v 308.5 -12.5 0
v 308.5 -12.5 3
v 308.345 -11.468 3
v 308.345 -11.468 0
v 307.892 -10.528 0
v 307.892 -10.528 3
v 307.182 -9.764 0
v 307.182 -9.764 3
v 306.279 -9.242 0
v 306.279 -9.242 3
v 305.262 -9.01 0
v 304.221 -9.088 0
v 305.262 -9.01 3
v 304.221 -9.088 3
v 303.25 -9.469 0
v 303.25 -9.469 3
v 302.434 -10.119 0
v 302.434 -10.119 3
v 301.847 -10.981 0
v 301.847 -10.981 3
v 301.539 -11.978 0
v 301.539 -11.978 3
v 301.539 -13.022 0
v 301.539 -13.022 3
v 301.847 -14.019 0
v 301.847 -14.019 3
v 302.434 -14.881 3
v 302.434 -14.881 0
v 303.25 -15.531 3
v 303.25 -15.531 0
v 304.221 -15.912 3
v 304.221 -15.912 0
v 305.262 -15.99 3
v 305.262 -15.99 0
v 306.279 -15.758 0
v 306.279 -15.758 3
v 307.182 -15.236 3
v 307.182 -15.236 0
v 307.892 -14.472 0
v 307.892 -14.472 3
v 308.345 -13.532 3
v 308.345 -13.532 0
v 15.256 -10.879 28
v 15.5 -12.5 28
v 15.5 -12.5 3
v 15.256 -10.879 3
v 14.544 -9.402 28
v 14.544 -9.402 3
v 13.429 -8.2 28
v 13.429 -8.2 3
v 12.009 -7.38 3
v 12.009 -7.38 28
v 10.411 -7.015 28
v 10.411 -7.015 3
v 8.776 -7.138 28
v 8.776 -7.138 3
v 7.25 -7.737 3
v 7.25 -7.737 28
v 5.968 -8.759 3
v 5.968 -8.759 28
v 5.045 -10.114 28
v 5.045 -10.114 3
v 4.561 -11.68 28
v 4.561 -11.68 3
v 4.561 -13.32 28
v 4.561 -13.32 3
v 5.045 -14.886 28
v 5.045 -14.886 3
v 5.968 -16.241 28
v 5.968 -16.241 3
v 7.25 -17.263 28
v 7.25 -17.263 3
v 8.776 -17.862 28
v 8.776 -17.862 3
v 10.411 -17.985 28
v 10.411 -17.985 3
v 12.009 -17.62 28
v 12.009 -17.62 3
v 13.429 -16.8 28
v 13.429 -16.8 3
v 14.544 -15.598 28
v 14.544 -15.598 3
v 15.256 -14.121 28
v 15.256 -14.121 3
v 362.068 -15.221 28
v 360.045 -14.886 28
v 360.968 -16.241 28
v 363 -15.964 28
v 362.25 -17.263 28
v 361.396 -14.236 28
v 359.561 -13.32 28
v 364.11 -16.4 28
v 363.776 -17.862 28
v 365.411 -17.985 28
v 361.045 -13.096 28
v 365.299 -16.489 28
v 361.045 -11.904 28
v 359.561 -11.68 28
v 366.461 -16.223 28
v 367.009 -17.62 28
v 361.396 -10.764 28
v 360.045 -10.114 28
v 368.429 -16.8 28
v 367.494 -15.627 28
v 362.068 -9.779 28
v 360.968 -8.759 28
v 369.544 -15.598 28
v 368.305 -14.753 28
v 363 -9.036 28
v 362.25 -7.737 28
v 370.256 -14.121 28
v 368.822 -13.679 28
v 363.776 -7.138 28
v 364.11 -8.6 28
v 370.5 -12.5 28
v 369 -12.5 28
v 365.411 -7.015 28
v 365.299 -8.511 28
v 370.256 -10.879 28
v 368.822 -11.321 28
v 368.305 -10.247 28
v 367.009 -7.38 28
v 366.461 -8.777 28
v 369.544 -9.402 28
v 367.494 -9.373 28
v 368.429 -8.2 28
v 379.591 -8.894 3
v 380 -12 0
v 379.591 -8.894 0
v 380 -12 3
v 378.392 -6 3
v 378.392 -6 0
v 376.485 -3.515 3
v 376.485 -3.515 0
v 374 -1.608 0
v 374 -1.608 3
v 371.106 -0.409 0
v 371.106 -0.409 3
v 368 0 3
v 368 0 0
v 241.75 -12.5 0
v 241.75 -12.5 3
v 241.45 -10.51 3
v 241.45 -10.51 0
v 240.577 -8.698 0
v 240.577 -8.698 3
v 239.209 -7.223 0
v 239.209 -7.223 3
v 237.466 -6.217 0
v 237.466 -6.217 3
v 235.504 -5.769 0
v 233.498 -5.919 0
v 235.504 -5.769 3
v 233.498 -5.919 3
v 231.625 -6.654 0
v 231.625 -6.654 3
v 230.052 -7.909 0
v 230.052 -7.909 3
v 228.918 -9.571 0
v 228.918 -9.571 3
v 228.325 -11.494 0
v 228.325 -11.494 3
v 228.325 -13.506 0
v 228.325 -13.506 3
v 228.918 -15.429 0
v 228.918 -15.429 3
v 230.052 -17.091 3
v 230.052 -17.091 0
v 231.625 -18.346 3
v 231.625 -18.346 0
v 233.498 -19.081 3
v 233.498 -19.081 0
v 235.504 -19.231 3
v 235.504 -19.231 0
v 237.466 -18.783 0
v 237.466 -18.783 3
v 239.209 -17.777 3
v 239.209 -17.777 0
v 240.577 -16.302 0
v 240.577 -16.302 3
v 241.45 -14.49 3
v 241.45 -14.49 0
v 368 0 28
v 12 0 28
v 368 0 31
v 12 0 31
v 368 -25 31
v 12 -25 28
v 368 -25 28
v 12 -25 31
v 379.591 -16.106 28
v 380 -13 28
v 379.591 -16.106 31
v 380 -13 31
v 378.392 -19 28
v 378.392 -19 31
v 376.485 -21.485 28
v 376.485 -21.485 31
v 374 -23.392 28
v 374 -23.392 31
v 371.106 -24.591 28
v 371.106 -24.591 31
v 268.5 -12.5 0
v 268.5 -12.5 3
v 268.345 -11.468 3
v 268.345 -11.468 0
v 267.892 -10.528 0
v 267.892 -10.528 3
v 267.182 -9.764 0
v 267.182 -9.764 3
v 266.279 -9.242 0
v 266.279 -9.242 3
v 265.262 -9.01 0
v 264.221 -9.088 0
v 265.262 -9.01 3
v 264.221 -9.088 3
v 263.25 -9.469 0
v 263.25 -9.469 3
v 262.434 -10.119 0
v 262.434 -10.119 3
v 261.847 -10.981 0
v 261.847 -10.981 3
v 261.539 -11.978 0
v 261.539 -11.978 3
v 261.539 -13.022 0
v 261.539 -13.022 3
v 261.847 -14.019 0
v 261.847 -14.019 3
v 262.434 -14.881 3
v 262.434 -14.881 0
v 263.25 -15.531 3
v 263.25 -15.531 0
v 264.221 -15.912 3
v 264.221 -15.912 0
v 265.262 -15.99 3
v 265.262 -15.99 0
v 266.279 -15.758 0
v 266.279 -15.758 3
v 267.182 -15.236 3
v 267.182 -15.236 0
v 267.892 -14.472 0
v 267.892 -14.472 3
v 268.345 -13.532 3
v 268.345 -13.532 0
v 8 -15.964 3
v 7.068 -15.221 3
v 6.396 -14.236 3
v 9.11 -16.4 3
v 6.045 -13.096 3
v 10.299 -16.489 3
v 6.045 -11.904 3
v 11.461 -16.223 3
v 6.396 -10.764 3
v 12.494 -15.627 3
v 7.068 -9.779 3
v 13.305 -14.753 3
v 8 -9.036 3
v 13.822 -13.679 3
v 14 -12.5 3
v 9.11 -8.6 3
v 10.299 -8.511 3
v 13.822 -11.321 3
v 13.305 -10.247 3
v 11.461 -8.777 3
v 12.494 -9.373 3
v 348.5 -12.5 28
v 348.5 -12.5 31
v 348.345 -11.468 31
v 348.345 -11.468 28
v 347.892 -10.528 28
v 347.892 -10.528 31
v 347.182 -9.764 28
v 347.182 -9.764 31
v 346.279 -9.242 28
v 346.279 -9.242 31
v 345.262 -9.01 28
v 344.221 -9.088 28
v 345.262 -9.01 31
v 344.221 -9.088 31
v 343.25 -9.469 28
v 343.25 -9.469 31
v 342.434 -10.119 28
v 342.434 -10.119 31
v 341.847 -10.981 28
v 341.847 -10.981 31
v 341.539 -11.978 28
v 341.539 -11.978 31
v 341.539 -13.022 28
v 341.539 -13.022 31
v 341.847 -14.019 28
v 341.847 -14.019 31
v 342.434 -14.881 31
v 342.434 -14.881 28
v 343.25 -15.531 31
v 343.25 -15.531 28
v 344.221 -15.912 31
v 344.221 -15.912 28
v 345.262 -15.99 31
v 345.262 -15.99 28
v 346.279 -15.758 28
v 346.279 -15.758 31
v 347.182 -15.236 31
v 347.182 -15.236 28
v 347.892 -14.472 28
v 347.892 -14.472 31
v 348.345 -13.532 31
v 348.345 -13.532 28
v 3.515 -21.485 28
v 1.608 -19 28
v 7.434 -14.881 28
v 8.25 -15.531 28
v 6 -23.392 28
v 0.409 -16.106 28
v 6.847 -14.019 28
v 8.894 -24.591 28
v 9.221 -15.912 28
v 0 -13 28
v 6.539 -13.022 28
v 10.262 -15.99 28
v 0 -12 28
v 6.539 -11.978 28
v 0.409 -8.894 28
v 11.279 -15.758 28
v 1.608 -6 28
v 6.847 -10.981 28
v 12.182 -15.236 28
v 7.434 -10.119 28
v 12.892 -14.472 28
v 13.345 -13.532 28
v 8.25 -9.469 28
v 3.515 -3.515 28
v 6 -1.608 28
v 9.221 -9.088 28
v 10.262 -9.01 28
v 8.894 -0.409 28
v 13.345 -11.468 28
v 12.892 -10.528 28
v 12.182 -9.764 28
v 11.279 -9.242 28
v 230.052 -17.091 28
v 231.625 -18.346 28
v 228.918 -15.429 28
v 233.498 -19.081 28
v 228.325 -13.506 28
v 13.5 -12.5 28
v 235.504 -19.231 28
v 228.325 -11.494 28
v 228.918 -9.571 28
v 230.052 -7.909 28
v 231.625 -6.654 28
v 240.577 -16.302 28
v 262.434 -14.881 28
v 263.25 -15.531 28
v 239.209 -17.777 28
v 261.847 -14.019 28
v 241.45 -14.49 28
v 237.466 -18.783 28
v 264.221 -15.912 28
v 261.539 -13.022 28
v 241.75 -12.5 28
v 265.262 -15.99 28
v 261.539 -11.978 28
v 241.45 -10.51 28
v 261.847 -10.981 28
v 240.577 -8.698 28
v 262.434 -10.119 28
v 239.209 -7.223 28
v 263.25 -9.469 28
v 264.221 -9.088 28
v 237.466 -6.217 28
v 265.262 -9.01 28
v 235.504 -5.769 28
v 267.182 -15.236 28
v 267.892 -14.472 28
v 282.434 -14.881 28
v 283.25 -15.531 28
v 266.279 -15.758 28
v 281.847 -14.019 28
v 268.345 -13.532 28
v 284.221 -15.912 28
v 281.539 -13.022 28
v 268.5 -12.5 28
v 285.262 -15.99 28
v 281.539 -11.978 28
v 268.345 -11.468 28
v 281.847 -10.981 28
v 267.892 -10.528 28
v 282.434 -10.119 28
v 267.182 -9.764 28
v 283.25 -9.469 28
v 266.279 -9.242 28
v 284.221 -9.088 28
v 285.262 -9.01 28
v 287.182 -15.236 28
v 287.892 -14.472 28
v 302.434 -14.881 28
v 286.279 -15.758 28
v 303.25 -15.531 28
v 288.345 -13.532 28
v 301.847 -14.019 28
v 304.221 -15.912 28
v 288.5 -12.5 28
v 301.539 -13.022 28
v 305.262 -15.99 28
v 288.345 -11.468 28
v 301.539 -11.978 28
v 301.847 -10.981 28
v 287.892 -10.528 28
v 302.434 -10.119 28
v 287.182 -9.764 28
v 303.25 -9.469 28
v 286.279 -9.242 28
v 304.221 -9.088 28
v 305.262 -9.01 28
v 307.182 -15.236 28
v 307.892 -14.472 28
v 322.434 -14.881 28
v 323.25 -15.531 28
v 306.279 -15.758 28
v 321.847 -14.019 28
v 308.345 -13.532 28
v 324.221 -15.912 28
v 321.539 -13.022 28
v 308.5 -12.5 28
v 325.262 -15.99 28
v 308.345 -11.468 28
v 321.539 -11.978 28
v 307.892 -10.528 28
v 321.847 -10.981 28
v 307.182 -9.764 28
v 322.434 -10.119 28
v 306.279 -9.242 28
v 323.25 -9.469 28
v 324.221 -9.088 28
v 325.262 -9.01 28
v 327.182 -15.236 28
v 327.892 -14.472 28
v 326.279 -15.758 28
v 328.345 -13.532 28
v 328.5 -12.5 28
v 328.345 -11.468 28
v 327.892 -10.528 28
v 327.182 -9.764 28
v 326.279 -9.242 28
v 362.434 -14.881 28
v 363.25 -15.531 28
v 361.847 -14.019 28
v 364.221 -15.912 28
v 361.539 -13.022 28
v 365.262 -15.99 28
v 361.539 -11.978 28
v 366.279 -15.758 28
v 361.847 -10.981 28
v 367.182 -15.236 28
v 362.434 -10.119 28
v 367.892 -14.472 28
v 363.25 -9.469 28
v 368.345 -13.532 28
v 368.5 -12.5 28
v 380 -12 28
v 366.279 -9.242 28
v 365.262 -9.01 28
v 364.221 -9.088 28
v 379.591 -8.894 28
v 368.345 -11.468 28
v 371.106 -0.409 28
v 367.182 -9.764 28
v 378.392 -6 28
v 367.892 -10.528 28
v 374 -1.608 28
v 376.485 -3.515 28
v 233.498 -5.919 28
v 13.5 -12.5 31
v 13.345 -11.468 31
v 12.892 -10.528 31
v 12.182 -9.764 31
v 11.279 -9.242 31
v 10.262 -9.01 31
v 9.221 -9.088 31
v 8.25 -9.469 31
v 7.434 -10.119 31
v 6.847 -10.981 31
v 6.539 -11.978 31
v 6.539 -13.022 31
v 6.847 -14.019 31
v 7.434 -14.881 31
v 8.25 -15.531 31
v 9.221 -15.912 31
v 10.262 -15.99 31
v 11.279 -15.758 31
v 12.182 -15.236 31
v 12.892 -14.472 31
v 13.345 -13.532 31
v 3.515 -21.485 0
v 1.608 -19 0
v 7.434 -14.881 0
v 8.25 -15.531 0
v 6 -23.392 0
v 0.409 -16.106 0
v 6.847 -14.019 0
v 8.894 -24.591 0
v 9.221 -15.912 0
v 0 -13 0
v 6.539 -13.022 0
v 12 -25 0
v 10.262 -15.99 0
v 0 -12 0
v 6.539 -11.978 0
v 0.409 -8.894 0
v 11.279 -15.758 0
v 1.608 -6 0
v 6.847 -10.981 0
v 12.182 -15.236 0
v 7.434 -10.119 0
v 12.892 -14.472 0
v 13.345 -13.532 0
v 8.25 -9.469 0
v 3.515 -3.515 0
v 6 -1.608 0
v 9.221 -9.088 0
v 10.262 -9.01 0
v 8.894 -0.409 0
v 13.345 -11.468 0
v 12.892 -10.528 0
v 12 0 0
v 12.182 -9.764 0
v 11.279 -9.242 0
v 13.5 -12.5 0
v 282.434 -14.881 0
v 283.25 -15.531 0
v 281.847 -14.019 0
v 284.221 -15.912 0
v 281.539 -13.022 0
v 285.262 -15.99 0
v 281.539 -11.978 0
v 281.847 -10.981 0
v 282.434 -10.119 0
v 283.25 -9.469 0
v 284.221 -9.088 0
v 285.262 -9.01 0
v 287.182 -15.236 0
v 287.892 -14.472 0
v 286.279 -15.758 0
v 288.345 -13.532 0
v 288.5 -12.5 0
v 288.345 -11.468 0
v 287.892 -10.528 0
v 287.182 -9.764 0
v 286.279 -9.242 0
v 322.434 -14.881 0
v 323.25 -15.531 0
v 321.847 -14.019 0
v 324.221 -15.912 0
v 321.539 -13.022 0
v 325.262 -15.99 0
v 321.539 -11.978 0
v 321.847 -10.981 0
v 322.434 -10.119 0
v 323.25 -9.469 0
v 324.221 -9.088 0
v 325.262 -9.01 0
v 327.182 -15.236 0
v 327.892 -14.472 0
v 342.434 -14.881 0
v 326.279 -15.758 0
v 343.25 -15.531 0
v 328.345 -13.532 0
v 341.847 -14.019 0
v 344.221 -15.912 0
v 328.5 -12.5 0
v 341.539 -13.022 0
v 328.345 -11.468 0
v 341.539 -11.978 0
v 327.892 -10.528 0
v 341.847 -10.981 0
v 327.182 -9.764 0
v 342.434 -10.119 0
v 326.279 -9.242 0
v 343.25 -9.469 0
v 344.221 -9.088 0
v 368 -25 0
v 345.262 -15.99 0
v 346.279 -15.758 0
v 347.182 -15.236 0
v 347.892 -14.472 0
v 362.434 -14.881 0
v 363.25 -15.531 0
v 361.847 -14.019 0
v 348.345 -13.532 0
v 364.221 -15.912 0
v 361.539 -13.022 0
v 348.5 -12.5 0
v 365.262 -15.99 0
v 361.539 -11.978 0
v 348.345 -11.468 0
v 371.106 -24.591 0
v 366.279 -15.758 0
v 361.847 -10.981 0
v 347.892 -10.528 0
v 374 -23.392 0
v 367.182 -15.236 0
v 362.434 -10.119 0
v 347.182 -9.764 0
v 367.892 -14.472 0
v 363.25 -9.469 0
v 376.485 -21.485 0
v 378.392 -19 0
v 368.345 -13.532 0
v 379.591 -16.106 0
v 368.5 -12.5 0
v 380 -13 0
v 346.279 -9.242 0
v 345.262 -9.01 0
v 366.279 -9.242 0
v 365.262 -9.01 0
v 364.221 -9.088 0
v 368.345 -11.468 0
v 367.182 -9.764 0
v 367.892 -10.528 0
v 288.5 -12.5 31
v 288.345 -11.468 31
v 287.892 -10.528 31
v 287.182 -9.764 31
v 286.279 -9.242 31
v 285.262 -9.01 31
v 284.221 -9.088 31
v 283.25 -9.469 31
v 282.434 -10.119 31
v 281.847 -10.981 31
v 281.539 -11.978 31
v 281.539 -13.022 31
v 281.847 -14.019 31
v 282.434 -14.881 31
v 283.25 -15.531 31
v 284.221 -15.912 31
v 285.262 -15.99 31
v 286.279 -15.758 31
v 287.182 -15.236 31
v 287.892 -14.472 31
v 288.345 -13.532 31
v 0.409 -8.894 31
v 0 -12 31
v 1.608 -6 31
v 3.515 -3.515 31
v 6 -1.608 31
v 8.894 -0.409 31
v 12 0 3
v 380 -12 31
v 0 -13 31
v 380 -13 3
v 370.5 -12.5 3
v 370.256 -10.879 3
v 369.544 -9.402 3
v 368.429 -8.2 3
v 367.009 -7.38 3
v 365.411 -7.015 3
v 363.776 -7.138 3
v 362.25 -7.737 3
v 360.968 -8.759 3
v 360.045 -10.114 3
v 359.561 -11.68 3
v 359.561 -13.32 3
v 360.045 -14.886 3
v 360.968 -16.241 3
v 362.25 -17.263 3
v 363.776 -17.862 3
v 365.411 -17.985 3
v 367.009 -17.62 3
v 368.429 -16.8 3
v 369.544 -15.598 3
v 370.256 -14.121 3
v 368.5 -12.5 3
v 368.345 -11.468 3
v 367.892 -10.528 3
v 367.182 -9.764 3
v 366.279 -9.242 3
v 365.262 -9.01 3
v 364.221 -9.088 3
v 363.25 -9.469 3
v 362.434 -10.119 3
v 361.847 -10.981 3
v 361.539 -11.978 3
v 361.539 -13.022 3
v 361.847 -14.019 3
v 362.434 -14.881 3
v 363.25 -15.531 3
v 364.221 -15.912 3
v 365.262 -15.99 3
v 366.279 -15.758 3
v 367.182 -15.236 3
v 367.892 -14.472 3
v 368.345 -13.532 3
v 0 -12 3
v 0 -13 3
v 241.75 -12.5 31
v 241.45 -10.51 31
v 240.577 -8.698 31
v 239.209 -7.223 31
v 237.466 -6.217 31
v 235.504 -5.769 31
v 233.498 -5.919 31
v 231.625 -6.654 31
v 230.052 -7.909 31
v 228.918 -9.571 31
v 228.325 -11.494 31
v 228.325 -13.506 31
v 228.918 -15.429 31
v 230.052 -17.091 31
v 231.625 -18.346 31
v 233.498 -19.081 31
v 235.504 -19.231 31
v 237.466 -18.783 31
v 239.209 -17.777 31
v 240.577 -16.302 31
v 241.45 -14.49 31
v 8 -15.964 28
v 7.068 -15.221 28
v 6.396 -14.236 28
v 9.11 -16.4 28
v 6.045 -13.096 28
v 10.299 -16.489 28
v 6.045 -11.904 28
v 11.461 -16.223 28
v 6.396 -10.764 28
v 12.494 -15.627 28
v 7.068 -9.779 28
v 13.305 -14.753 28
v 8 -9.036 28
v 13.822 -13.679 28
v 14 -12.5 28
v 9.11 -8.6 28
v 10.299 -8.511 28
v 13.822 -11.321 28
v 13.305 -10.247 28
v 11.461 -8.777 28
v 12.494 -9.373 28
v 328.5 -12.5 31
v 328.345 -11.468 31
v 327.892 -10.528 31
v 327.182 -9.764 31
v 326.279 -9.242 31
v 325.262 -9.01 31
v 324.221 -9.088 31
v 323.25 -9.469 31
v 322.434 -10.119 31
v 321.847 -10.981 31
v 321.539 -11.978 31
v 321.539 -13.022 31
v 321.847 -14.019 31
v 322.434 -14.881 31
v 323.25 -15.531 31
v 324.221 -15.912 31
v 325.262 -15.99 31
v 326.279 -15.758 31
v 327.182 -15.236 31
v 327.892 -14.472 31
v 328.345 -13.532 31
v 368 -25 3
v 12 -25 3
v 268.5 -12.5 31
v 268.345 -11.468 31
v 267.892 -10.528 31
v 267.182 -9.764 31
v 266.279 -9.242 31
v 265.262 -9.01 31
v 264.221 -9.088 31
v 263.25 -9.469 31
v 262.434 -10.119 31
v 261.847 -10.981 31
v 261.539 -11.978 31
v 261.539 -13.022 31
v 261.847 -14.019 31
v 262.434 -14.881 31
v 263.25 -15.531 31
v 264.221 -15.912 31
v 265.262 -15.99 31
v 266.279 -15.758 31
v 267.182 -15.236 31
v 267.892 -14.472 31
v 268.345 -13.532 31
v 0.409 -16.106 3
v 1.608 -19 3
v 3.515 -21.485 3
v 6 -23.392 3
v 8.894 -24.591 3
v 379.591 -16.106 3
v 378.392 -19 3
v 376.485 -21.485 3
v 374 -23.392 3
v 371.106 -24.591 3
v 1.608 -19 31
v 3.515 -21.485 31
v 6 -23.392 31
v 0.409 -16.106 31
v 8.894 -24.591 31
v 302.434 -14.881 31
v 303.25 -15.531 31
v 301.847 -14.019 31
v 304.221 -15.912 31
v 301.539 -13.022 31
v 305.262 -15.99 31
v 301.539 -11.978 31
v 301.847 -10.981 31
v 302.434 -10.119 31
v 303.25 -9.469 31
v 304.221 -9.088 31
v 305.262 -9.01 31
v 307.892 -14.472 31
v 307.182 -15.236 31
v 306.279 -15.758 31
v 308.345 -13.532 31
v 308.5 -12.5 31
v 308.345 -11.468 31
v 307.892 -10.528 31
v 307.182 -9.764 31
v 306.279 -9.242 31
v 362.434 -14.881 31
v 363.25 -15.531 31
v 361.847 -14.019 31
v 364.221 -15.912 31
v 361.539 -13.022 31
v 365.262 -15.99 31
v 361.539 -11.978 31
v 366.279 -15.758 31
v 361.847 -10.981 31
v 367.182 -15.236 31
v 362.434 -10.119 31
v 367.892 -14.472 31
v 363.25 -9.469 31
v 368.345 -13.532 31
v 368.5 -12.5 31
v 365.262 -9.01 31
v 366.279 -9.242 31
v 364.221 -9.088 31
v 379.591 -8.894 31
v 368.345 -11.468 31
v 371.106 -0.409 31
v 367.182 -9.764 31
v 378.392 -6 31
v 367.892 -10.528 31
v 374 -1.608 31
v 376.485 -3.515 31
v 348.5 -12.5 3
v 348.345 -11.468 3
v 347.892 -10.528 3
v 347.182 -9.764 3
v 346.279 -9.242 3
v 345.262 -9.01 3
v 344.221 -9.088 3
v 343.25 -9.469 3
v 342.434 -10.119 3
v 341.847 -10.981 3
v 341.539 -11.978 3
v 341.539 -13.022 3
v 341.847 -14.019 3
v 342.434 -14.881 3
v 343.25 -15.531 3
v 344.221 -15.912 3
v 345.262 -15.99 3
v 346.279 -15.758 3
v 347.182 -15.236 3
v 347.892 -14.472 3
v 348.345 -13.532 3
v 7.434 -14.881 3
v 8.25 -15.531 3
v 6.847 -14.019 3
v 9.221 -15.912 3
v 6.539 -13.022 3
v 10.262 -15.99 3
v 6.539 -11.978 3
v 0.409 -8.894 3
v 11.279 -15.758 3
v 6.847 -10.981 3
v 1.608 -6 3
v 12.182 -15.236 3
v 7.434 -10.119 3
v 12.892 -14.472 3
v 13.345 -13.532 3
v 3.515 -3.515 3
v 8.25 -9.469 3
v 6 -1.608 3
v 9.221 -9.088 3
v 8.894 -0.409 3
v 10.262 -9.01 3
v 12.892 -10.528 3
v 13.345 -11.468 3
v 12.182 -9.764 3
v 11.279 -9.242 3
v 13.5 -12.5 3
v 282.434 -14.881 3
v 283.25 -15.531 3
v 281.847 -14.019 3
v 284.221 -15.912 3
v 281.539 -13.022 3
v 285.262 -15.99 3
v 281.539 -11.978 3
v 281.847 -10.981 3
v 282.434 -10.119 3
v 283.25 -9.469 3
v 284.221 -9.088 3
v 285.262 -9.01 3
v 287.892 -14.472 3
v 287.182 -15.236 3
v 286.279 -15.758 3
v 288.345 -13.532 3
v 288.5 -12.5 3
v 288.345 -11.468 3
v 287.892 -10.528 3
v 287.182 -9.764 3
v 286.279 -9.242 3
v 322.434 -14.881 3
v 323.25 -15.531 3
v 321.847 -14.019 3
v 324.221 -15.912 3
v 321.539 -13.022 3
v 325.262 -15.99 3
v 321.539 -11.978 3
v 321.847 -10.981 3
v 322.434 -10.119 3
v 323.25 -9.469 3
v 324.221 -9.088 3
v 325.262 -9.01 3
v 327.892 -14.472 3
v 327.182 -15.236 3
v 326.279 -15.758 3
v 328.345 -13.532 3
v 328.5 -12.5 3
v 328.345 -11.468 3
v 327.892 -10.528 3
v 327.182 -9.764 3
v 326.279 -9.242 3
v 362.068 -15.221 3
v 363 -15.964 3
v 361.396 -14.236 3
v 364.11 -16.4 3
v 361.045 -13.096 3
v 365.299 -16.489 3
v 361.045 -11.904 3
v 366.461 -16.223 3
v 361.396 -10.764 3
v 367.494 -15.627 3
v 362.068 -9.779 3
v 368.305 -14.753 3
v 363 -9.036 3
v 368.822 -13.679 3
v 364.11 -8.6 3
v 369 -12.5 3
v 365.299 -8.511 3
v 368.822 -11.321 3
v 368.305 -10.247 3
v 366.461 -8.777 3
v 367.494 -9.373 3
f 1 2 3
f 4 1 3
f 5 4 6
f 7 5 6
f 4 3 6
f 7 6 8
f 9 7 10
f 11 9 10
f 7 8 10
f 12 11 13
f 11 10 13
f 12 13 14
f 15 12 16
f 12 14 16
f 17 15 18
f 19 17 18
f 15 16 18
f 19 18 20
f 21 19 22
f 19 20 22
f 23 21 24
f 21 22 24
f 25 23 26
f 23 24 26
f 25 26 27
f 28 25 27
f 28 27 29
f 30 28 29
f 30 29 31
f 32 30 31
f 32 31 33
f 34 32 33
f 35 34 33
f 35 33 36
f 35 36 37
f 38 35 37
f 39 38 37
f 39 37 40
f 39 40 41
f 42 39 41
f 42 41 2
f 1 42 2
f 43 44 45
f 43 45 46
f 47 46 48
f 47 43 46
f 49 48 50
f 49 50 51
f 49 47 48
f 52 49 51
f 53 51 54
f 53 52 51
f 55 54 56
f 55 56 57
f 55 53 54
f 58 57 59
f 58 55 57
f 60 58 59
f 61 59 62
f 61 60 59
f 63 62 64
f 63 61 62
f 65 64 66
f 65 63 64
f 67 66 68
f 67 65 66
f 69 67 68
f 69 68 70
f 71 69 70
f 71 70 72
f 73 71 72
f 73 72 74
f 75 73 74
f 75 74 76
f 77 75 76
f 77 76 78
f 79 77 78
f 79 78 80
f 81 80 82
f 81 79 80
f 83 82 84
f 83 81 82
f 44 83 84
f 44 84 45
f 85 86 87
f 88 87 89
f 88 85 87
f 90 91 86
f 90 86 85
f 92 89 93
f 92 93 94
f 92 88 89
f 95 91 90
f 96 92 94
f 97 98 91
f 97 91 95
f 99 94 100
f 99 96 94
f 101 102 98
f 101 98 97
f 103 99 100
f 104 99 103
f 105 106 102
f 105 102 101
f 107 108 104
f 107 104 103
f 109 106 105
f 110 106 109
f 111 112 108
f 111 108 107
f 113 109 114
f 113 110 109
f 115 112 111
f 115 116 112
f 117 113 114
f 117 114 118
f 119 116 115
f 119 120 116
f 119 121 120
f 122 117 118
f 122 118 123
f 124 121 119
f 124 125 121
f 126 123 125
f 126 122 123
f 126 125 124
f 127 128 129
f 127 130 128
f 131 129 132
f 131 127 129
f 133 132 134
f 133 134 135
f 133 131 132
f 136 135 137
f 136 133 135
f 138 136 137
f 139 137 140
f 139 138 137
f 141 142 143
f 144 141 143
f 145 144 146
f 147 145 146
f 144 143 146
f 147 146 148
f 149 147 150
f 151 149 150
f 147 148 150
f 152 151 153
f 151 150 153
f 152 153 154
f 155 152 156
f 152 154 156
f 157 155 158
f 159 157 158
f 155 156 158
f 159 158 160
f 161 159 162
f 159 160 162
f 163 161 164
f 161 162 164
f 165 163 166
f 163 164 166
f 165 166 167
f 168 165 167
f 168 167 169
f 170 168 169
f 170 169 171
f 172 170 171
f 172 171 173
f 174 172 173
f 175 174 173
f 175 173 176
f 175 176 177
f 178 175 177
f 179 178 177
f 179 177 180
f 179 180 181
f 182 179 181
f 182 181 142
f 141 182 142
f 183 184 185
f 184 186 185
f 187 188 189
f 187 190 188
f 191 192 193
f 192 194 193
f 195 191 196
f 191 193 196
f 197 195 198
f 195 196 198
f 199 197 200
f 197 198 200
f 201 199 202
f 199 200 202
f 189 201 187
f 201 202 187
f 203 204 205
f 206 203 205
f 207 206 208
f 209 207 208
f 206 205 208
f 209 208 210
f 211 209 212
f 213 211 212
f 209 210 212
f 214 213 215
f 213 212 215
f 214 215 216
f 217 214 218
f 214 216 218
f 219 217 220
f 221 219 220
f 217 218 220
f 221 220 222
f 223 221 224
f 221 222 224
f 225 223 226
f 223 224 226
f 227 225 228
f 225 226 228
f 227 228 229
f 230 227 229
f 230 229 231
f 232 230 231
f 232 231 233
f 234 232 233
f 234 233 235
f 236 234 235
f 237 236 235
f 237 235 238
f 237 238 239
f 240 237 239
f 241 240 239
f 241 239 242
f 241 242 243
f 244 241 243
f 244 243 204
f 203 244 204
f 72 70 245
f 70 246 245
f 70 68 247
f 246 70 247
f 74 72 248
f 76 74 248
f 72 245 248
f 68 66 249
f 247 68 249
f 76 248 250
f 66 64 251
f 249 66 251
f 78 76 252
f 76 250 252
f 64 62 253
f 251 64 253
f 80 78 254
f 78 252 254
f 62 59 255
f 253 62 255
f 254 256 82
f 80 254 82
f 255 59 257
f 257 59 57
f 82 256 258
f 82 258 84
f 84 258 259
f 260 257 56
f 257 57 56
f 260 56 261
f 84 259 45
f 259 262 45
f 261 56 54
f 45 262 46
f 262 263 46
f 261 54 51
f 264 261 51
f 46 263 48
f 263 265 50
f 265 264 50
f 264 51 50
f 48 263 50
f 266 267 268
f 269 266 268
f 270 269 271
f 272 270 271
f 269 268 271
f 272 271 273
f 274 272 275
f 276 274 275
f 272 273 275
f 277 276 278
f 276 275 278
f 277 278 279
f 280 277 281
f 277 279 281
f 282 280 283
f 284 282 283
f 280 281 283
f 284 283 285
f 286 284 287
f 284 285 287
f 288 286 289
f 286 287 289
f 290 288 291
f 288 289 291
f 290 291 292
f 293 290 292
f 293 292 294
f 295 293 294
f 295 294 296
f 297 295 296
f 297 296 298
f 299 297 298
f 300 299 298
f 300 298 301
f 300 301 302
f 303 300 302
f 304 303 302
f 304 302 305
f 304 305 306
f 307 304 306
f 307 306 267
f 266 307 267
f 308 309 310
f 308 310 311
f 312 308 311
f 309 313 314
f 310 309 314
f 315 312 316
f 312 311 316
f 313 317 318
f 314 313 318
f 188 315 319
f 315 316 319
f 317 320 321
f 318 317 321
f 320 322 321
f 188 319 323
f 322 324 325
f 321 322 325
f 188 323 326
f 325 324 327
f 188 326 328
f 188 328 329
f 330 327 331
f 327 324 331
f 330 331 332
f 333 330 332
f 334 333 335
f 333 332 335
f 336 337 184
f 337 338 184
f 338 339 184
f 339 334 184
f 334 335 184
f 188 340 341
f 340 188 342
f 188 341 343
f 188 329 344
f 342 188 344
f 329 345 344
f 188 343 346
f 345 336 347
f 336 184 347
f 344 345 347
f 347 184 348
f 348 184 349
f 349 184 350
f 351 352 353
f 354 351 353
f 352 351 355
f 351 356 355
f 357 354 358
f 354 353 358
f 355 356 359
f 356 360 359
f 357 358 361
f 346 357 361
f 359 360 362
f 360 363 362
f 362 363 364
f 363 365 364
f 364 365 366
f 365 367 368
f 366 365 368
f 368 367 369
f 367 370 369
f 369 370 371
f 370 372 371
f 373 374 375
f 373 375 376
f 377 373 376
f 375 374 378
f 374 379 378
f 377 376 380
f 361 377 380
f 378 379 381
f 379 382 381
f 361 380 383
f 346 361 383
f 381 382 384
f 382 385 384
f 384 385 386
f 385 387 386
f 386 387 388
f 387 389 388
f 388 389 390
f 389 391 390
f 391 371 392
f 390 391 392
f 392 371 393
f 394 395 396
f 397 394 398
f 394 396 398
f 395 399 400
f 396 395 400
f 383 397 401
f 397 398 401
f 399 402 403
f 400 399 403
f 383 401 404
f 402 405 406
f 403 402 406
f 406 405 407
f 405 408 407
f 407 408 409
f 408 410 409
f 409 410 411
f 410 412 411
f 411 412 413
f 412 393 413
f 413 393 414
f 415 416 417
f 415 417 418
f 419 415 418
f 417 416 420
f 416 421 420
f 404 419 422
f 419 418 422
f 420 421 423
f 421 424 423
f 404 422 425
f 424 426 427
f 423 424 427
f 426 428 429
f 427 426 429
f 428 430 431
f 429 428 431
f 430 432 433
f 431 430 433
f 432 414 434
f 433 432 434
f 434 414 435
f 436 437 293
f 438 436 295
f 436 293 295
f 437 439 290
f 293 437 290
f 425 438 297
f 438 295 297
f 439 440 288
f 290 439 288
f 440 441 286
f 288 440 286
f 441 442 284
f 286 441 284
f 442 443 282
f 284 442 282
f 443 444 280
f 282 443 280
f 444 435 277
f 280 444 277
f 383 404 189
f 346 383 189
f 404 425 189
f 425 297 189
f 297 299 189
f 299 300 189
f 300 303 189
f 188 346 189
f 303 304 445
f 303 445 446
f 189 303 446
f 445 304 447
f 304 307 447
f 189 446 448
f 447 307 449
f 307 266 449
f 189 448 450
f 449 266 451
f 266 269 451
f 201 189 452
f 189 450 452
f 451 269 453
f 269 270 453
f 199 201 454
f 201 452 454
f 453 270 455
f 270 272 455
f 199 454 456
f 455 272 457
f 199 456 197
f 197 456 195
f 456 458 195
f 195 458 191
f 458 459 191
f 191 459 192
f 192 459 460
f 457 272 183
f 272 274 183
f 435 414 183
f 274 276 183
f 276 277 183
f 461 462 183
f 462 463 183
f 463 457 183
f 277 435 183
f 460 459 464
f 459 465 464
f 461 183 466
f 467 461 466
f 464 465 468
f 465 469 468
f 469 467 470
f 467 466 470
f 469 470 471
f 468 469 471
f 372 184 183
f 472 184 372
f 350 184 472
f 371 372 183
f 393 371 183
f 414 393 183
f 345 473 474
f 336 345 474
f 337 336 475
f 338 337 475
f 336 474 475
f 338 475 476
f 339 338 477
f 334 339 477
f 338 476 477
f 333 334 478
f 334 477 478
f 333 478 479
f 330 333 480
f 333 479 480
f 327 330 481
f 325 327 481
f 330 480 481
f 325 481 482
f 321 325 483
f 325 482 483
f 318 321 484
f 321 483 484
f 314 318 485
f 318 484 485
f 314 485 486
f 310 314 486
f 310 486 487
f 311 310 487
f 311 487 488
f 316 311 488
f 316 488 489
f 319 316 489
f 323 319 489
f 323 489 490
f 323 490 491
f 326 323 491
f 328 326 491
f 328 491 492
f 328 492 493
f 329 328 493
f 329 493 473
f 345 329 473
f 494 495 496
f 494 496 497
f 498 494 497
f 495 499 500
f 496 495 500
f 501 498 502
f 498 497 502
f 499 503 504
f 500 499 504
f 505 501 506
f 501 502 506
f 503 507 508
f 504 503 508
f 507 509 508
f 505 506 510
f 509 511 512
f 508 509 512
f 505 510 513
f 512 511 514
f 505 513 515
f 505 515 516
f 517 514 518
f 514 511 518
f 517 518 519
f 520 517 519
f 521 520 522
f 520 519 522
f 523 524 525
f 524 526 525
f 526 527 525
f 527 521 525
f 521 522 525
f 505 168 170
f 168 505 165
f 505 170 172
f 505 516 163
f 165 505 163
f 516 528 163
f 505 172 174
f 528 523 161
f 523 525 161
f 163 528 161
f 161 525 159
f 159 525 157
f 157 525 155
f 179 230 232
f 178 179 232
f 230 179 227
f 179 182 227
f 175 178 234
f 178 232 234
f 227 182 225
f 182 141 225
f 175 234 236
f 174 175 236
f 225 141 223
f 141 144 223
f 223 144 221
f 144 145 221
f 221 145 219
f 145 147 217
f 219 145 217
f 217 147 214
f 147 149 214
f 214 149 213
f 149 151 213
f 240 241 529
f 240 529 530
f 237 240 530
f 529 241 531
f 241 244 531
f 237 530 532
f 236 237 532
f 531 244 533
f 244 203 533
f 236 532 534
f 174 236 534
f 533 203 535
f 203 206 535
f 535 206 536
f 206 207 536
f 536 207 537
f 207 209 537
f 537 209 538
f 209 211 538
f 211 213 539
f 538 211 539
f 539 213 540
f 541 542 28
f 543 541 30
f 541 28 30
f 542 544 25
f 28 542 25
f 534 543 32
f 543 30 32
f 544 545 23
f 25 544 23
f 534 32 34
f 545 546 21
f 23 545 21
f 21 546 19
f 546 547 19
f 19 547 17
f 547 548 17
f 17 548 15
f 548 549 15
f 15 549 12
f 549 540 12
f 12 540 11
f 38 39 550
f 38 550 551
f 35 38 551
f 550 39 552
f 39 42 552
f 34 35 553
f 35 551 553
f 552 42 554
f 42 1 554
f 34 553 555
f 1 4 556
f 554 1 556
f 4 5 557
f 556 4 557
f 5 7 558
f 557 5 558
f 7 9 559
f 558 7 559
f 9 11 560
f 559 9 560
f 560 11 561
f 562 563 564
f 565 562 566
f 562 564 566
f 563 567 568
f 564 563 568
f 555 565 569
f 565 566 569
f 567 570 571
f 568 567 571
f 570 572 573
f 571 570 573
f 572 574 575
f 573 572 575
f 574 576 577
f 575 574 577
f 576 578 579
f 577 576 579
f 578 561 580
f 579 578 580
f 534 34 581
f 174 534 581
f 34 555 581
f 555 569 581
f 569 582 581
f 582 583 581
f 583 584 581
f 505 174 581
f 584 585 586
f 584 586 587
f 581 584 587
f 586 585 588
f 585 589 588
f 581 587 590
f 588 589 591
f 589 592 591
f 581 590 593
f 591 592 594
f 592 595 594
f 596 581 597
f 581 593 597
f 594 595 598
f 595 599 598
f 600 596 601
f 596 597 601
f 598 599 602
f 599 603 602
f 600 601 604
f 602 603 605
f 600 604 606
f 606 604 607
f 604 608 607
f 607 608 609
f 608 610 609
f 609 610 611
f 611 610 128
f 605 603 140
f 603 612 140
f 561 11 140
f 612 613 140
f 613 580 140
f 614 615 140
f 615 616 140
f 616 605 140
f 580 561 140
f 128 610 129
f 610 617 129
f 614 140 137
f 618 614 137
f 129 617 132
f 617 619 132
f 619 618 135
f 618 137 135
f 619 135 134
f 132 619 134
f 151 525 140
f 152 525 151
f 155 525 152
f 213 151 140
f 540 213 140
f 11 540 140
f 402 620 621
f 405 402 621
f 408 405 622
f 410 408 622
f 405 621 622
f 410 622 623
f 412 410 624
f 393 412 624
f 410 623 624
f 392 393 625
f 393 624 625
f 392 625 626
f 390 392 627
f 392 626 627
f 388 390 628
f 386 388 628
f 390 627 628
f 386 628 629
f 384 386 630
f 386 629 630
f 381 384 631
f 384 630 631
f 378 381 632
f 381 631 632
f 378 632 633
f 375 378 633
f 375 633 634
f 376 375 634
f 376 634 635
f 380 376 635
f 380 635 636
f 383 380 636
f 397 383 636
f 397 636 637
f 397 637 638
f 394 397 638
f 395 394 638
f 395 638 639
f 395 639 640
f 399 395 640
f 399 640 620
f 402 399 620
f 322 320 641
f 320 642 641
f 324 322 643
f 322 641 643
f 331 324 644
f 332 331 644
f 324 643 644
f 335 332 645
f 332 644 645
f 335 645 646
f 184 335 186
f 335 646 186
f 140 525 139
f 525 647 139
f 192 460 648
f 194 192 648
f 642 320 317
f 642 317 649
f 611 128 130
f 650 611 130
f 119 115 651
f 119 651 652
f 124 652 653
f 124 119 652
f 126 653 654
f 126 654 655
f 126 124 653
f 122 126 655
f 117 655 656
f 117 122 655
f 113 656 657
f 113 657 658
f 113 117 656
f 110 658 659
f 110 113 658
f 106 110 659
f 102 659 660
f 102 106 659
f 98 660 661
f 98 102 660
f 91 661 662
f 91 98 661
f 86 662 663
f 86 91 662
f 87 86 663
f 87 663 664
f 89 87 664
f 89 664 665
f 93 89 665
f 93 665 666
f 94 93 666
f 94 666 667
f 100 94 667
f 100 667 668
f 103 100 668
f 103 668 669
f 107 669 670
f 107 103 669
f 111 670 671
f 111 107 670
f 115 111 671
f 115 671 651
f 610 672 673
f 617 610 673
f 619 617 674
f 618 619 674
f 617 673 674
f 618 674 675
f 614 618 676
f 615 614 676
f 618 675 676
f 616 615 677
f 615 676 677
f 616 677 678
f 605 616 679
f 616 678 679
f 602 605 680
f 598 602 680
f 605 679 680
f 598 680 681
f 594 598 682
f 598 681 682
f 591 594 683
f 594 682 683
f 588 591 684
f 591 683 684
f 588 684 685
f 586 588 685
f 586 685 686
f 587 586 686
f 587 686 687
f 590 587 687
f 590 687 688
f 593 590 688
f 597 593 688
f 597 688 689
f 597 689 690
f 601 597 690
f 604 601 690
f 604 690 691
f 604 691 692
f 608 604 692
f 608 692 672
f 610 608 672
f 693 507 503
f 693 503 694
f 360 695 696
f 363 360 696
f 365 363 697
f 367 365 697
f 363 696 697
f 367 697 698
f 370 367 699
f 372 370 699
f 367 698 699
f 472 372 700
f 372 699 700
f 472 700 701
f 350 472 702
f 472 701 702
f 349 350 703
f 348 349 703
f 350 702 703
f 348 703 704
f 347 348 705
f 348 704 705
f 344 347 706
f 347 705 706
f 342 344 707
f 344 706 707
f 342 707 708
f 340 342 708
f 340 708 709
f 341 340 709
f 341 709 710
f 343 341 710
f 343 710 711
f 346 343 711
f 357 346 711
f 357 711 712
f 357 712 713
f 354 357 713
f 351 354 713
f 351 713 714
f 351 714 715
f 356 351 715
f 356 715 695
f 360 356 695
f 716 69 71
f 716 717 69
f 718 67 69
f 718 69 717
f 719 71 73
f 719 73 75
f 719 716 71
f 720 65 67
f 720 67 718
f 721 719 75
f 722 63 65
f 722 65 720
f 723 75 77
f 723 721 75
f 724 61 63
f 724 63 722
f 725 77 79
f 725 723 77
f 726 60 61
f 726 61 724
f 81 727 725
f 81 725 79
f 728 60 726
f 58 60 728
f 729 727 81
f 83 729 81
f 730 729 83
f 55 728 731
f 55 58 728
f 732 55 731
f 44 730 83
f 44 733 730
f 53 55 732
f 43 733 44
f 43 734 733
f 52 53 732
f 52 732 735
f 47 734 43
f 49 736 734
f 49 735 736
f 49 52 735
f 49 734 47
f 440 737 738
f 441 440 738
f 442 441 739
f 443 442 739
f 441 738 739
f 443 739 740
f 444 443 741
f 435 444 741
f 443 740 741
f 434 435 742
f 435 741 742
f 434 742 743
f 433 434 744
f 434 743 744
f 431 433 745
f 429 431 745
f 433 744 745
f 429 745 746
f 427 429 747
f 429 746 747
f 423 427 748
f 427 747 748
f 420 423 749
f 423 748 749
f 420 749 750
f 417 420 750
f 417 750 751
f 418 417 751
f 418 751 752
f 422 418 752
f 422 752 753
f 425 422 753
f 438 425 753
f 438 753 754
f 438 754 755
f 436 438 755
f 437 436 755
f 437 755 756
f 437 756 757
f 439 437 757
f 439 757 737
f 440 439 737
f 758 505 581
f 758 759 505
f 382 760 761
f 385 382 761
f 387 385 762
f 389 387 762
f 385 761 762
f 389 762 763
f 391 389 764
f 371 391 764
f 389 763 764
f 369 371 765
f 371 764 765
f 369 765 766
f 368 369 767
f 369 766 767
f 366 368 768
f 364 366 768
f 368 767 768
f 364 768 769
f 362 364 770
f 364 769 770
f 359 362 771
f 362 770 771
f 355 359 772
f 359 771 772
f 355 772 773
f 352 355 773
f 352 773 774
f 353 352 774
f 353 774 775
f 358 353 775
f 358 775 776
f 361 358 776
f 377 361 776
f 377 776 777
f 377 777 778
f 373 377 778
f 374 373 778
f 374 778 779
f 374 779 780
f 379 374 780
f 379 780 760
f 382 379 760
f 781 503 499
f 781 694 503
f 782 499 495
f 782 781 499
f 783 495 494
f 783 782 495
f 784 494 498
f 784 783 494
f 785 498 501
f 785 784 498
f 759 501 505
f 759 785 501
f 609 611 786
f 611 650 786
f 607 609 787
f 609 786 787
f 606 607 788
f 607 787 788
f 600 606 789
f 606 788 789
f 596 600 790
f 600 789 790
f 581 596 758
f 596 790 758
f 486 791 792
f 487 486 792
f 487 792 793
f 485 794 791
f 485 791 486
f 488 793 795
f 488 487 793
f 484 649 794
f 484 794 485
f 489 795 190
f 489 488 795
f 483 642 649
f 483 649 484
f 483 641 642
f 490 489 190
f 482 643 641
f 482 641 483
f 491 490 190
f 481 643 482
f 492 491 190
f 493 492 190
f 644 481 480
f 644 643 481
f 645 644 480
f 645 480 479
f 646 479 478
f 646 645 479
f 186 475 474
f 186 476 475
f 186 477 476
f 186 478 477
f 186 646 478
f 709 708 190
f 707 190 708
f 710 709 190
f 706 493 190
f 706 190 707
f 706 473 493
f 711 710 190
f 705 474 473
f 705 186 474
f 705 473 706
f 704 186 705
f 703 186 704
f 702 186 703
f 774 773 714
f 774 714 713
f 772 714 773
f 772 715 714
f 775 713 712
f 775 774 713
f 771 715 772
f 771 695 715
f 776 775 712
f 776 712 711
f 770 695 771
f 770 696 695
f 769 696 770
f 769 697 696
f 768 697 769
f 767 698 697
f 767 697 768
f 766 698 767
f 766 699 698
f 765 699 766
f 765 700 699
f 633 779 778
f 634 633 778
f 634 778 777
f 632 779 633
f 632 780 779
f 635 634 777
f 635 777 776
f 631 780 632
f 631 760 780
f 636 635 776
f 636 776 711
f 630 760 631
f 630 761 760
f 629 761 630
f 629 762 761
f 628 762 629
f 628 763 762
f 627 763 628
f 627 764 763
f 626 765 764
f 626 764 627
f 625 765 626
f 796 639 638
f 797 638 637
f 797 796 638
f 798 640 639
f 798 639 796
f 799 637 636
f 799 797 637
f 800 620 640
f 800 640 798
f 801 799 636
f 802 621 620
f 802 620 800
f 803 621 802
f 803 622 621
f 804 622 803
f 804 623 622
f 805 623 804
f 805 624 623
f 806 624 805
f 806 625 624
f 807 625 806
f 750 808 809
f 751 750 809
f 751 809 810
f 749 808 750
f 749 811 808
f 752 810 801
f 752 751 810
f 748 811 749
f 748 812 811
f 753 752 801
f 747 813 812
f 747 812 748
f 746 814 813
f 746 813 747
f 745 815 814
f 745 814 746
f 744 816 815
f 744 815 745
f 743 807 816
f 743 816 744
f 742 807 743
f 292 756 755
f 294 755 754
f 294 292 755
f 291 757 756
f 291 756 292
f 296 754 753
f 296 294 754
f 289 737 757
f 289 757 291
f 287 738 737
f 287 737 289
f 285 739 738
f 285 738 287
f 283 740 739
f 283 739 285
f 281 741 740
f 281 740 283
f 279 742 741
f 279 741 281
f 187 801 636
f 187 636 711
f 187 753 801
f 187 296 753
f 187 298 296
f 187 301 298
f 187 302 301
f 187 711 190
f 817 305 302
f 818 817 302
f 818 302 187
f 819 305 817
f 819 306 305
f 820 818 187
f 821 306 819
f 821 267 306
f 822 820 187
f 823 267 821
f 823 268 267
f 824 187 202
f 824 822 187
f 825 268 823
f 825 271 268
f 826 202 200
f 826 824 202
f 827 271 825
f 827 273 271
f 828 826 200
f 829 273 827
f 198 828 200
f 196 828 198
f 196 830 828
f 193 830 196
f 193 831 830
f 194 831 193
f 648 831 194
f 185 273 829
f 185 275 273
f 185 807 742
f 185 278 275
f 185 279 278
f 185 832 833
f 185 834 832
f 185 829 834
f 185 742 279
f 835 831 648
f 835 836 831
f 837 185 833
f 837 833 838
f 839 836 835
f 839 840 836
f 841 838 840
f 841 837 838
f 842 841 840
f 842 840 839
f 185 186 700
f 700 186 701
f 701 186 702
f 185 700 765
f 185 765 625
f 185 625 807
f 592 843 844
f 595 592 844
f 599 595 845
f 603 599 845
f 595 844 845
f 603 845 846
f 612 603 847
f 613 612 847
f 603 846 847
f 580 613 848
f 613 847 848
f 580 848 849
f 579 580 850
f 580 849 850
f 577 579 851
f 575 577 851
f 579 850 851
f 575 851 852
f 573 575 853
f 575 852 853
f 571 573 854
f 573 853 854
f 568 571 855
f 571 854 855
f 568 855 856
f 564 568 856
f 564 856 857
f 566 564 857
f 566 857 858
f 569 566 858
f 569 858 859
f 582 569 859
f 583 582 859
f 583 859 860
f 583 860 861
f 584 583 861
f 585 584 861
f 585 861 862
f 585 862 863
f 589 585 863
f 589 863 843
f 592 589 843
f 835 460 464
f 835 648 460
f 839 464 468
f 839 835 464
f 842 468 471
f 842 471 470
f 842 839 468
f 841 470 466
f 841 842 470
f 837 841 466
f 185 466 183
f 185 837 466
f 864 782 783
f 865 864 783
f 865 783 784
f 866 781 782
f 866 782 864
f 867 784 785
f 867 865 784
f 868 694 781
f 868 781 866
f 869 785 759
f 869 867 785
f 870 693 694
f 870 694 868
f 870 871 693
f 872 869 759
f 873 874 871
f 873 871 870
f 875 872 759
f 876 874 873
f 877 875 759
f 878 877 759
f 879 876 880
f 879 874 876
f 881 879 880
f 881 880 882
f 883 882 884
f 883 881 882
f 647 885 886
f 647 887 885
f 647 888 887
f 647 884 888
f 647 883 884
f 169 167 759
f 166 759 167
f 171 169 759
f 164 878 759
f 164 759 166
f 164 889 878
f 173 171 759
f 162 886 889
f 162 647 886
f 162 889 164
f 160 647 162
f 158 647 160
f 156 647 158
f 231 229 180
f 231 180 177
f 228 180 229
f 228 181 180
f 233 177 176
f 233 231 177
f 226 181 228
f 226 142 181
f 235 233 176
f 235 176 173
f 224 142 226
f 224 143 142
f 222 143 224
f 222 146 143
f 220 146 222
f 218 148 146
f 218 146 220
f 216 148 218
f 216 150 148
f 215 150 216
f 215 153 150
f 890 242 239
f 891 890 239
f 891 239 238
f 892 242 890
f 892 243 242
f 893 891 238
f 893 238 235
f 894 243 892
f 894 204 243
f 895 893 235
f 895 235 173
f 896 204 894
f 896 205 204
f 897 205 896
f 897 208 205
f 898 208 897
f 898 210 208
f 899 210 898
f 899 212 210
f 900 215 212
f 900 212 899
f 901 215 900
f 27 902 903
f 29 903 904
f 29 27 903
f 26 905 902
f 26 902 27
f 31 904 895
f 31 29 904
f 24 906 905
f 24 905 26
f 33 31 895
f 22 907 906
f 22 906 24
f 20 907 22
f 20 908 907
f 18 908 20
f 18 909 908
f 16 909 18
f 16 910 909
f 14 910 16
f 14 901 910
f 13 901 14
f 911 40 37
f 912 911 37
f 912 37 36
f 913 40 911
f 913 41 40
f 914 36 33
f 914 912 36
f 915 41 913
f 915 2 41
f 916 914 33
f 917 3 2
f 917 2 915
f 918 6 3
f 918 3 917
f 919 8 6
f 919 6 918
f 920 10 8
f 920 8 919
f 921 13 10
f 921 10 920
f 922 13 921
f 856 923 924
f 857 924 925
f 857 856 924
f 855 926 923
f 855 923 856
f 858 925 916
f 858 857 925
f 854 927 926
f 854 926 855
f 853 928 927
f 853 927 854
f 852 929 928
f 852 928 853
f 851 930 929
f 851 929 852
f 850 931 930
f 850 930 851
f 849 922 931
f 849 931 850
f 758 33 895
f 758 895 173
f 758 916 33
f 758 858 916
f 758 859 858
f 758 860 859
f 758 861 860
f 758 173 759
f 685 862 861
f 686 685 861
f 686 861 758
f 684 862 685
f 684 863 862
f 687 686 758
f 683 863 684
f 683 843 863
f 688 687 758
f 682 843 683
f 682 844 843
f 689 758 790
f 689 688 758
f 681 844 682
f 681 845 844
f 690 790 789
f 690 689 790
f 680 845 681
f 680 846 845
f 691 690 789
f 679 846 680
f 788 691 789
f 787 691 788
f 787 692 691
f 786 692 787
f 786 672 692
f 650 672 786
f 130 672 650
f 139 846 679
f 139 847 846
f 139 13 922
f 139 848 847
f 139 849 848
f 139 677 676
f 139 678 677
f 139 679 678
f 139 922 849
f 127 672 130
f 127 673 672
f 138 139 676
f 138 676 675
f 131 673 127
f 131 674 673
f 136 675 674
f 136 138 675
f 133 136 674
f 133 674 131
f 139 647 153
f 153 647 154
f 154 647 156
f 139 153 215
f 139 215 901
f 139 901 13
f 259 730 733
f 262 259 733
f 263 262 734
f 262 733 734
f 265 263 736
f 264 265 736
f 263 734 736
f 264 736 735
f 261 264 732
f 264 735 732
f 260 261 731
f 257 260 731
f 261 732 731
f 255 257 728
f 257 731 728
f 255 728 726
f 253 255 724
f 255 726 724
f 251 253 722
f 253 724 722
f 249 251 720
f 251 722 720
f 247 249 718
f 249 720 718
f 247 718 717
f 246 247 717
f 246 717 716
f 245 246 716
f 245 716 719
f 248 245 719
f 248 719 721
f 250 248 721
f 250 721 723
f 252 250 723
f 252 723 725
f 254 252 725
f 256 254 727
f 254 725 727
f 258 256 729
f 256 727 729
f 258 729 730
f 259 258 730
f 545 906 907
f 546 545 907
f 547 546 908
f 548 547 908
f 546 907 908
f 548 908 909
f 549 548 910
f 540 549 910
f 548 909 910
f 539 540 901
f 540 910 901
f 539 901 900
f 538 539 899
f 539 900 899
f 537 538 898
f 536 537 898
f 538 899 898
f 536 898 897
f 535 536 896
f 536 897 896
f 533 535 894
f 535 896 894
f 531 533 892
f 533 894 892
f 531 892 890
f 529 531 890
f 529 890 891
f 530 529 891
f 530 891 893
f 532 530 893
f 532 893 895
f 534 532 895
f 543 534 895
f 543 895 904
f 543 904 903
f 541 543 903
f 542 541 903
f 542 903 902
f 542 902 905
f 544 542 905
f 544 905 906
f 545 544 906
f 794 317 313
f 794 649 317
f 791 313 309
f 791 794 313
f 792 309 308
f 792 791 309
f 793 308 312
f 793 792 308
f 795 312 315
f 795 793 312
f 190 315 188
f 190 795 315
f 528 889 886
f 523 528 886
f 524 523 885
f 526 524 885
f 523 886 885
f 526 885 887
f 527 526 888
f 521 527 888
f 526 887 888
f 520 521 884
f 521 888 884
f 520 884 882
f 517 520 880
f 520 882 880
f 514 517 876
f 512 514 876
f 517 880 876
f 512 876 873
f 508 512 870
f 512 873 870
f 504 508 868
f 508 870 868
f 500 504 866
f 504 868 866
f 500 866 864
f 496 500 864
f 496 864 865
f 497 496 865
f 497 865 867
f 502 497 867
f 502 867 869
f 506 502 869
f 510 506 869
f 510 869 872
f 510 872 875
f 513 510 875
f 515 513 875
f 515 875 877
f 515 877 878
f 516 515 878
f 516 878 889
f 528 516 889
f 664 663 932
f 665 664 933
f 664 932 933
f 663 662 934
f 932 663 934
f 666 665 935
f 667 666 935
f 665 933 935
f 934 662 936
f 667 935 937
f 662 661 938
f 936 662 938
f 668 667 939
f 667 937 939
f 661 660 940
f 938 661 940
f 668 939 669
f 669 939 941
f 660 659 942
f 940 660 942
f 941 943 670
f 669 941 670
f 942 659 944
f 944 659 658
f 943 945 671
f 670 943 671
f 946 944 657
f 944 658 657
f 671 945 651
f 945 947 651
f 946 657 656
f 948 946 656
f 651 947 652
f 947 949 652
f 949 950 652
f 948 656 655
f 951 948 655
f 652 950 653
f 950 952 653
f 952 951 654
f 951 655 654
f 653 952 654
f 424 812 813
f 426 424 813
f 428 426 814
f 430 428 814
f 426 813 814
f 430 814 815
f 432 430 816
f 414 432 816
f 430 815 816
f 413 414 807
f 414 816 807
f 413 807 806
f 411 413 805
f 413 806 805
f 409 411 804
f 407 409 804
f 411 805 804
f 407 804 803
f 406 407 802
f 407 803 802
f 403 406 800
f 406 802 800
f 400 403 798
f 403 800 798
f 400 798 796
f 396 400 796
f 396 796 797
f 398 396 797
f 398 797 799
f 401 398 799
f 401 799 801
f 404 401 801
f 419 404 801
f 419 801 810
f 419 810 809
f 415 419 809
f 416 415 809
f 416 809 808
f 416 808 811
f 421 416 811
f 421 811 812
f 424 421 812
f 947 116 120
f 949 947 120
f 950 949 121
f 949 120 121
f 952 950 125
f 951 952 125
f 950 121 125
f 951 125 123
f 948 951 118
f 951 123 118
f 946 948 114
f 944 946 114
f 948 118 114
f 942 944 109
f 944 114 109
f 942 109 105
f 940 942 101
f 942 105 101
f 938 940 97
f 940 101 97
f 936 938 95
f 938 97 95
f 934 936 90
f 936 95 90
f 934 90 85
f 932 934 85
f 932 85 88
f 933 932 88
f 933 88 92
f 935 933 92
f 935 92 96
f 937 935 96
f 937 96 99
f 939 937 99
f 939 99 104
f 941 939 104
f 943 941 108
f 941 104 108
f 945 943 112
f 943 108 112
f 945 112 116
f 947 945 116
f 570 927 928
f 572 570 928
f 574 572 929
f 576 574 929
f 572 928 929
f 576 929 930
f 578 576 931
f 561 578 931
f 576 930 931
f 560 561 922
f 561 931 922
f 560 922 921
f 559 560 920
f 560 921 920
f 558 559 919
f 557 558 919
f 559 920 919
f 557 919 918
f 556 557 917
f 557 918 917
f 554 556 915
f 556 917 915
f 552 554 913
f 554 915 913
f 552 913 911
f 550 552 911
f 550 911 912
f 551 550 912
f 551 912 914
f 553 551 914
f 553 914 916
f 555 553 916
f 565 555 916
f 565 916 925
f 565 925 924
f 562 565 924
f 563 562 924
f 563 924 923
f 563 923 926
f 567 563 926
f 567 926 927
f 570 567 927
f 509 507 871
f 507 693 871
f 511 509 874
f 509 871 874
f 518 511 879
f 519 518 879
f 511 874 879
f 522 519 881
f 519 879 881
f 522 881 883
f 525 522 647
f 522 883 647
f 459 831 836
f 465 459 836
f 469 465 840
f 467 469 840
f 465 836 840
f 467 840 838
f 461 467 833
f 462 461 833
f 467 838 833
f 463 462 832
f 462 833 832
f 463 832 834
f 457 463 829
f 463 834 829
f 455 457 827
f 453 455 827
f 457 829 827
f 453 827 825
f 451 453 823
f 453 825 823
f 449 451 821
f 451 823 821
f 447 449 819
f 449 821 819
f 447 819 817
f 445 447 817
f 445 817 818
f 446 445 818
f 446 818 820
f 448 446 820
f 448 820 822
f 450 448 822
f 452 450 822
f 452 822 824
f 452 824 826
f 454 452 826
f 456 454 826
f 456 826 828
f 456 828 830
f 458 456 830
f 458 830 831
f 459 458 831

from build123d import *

# Parameters (mm, degrees)
F0_W     = 380
F0_H     = 3
F1_DEPTH = 25
F2_R     = 12
F2_2_R   = 12
F3_R     = 3.5
F3_R_2   = 6.75
F4_DEPTH = 35
F5_START = -3
F3_R_3   = 5.5
F3_R_4   = 4
F5_DEPTH = 25


with BuildPart() as f1:
    # F0 (on Front) → F1 (new body)
    with BuildSketch(Plane.XZ):
        with Locations((190, 29.5)):
            Rectangle(F0_W, F0_H)
    extrude(amount=F1_DEPTH)

    # F2
    f2_edges = [f1.edges().sort_by_distance(p)[0] for p in [
        (380, -25, 29.5),
        (380, 0, 29.5),
        (0, -25, 29.5),
        (0, 0, 29.5),
    ]]
    fillet(f2_edges, radius=F2_R)


with BuildPart() as f1b:
    # F0 (on Front) → F1, piece 2 (new body)
    with BuildSketch(Plane.XZ):
        with Locations((190, 1.5)):
            Rectangle(F0_W, F0_H)
    extrude(amount=F1_DEPTH)

    # F2#2
    f2_2_edges = [f1b.edges().sort_by_distance(p)[0] for p in [
        (380, 0, 1.5),
        (380, -25, 1.5),
        (0, 0, 1.5),
        (0, -25, 1.5),
    ]]
    fillet(f2_2_edges, radius=F2_2_R)


with BuildPart() as f4_tool:
    # F3 (on face) → F4 (new body)
    with BuildSketch(Plane.XY.offset(31)):
        with Locations((10, -12.5)):
            Circle(F3_R)
        with Locations((235, -12.5)):
            Circle(F3_R_2)
        with Locations((365, -12.5)):
            Circle(F3_R)
        with Locations((265, -12.5)):
            Circle(F3_R)
        with Locations((285, -12.5)):
            Circle(F3_R)
        with Locations((305, -12.5)):
            Circle(F3_R)
        with Locations((325, -12.5)):
            Circle(F3_R)
        with Locations((345, -12.5)):
            Circle(F3_R)
    extrude(amount=-F4_DEPTH)


with BuildPart() as f1_1:
    add(f1.part)

    # F4: cut by f4_tool
    add(f4_tool.part, mode=Mode.SUBTRACT)


with BuildPart() as f1b_1:
    add(f1b.part)

    # F4: cut by f4_tool
    add(f4_tool.part, mode=Mode.SUBTRACT)


with BuildPart() as f5:
    # F3 (on face) → F5 (new body)
    with BuildSketch(Plane.XY.offset(31).offset(F5_START)):
        with Locations((10, -12.5)):
            Circle(F3_R_3)
        with Locations((10, -12.5)):
            Circle(F3_R_4, mode=Mode.SUBTRACT)
    extrude(amount=-F5_DEPTH)


with BuildPart() as f5b:
    # F3 (on face) → F5, piece 2 (new body)
    with BuildSketch(Plane.XY.offset(31).offset(F5_START)):
        with Locations((365, -12.5)):
            Circle(F3_R_3)
        with Locations((365, -12.5)):
            Circle(F3_R_4, mode=Mode.SUBTRACT)
    extrude(amount=-F5_DEPTH)


solid = Compound([f1_1.part, f1b_1.part, f5.part, f5b.part])
